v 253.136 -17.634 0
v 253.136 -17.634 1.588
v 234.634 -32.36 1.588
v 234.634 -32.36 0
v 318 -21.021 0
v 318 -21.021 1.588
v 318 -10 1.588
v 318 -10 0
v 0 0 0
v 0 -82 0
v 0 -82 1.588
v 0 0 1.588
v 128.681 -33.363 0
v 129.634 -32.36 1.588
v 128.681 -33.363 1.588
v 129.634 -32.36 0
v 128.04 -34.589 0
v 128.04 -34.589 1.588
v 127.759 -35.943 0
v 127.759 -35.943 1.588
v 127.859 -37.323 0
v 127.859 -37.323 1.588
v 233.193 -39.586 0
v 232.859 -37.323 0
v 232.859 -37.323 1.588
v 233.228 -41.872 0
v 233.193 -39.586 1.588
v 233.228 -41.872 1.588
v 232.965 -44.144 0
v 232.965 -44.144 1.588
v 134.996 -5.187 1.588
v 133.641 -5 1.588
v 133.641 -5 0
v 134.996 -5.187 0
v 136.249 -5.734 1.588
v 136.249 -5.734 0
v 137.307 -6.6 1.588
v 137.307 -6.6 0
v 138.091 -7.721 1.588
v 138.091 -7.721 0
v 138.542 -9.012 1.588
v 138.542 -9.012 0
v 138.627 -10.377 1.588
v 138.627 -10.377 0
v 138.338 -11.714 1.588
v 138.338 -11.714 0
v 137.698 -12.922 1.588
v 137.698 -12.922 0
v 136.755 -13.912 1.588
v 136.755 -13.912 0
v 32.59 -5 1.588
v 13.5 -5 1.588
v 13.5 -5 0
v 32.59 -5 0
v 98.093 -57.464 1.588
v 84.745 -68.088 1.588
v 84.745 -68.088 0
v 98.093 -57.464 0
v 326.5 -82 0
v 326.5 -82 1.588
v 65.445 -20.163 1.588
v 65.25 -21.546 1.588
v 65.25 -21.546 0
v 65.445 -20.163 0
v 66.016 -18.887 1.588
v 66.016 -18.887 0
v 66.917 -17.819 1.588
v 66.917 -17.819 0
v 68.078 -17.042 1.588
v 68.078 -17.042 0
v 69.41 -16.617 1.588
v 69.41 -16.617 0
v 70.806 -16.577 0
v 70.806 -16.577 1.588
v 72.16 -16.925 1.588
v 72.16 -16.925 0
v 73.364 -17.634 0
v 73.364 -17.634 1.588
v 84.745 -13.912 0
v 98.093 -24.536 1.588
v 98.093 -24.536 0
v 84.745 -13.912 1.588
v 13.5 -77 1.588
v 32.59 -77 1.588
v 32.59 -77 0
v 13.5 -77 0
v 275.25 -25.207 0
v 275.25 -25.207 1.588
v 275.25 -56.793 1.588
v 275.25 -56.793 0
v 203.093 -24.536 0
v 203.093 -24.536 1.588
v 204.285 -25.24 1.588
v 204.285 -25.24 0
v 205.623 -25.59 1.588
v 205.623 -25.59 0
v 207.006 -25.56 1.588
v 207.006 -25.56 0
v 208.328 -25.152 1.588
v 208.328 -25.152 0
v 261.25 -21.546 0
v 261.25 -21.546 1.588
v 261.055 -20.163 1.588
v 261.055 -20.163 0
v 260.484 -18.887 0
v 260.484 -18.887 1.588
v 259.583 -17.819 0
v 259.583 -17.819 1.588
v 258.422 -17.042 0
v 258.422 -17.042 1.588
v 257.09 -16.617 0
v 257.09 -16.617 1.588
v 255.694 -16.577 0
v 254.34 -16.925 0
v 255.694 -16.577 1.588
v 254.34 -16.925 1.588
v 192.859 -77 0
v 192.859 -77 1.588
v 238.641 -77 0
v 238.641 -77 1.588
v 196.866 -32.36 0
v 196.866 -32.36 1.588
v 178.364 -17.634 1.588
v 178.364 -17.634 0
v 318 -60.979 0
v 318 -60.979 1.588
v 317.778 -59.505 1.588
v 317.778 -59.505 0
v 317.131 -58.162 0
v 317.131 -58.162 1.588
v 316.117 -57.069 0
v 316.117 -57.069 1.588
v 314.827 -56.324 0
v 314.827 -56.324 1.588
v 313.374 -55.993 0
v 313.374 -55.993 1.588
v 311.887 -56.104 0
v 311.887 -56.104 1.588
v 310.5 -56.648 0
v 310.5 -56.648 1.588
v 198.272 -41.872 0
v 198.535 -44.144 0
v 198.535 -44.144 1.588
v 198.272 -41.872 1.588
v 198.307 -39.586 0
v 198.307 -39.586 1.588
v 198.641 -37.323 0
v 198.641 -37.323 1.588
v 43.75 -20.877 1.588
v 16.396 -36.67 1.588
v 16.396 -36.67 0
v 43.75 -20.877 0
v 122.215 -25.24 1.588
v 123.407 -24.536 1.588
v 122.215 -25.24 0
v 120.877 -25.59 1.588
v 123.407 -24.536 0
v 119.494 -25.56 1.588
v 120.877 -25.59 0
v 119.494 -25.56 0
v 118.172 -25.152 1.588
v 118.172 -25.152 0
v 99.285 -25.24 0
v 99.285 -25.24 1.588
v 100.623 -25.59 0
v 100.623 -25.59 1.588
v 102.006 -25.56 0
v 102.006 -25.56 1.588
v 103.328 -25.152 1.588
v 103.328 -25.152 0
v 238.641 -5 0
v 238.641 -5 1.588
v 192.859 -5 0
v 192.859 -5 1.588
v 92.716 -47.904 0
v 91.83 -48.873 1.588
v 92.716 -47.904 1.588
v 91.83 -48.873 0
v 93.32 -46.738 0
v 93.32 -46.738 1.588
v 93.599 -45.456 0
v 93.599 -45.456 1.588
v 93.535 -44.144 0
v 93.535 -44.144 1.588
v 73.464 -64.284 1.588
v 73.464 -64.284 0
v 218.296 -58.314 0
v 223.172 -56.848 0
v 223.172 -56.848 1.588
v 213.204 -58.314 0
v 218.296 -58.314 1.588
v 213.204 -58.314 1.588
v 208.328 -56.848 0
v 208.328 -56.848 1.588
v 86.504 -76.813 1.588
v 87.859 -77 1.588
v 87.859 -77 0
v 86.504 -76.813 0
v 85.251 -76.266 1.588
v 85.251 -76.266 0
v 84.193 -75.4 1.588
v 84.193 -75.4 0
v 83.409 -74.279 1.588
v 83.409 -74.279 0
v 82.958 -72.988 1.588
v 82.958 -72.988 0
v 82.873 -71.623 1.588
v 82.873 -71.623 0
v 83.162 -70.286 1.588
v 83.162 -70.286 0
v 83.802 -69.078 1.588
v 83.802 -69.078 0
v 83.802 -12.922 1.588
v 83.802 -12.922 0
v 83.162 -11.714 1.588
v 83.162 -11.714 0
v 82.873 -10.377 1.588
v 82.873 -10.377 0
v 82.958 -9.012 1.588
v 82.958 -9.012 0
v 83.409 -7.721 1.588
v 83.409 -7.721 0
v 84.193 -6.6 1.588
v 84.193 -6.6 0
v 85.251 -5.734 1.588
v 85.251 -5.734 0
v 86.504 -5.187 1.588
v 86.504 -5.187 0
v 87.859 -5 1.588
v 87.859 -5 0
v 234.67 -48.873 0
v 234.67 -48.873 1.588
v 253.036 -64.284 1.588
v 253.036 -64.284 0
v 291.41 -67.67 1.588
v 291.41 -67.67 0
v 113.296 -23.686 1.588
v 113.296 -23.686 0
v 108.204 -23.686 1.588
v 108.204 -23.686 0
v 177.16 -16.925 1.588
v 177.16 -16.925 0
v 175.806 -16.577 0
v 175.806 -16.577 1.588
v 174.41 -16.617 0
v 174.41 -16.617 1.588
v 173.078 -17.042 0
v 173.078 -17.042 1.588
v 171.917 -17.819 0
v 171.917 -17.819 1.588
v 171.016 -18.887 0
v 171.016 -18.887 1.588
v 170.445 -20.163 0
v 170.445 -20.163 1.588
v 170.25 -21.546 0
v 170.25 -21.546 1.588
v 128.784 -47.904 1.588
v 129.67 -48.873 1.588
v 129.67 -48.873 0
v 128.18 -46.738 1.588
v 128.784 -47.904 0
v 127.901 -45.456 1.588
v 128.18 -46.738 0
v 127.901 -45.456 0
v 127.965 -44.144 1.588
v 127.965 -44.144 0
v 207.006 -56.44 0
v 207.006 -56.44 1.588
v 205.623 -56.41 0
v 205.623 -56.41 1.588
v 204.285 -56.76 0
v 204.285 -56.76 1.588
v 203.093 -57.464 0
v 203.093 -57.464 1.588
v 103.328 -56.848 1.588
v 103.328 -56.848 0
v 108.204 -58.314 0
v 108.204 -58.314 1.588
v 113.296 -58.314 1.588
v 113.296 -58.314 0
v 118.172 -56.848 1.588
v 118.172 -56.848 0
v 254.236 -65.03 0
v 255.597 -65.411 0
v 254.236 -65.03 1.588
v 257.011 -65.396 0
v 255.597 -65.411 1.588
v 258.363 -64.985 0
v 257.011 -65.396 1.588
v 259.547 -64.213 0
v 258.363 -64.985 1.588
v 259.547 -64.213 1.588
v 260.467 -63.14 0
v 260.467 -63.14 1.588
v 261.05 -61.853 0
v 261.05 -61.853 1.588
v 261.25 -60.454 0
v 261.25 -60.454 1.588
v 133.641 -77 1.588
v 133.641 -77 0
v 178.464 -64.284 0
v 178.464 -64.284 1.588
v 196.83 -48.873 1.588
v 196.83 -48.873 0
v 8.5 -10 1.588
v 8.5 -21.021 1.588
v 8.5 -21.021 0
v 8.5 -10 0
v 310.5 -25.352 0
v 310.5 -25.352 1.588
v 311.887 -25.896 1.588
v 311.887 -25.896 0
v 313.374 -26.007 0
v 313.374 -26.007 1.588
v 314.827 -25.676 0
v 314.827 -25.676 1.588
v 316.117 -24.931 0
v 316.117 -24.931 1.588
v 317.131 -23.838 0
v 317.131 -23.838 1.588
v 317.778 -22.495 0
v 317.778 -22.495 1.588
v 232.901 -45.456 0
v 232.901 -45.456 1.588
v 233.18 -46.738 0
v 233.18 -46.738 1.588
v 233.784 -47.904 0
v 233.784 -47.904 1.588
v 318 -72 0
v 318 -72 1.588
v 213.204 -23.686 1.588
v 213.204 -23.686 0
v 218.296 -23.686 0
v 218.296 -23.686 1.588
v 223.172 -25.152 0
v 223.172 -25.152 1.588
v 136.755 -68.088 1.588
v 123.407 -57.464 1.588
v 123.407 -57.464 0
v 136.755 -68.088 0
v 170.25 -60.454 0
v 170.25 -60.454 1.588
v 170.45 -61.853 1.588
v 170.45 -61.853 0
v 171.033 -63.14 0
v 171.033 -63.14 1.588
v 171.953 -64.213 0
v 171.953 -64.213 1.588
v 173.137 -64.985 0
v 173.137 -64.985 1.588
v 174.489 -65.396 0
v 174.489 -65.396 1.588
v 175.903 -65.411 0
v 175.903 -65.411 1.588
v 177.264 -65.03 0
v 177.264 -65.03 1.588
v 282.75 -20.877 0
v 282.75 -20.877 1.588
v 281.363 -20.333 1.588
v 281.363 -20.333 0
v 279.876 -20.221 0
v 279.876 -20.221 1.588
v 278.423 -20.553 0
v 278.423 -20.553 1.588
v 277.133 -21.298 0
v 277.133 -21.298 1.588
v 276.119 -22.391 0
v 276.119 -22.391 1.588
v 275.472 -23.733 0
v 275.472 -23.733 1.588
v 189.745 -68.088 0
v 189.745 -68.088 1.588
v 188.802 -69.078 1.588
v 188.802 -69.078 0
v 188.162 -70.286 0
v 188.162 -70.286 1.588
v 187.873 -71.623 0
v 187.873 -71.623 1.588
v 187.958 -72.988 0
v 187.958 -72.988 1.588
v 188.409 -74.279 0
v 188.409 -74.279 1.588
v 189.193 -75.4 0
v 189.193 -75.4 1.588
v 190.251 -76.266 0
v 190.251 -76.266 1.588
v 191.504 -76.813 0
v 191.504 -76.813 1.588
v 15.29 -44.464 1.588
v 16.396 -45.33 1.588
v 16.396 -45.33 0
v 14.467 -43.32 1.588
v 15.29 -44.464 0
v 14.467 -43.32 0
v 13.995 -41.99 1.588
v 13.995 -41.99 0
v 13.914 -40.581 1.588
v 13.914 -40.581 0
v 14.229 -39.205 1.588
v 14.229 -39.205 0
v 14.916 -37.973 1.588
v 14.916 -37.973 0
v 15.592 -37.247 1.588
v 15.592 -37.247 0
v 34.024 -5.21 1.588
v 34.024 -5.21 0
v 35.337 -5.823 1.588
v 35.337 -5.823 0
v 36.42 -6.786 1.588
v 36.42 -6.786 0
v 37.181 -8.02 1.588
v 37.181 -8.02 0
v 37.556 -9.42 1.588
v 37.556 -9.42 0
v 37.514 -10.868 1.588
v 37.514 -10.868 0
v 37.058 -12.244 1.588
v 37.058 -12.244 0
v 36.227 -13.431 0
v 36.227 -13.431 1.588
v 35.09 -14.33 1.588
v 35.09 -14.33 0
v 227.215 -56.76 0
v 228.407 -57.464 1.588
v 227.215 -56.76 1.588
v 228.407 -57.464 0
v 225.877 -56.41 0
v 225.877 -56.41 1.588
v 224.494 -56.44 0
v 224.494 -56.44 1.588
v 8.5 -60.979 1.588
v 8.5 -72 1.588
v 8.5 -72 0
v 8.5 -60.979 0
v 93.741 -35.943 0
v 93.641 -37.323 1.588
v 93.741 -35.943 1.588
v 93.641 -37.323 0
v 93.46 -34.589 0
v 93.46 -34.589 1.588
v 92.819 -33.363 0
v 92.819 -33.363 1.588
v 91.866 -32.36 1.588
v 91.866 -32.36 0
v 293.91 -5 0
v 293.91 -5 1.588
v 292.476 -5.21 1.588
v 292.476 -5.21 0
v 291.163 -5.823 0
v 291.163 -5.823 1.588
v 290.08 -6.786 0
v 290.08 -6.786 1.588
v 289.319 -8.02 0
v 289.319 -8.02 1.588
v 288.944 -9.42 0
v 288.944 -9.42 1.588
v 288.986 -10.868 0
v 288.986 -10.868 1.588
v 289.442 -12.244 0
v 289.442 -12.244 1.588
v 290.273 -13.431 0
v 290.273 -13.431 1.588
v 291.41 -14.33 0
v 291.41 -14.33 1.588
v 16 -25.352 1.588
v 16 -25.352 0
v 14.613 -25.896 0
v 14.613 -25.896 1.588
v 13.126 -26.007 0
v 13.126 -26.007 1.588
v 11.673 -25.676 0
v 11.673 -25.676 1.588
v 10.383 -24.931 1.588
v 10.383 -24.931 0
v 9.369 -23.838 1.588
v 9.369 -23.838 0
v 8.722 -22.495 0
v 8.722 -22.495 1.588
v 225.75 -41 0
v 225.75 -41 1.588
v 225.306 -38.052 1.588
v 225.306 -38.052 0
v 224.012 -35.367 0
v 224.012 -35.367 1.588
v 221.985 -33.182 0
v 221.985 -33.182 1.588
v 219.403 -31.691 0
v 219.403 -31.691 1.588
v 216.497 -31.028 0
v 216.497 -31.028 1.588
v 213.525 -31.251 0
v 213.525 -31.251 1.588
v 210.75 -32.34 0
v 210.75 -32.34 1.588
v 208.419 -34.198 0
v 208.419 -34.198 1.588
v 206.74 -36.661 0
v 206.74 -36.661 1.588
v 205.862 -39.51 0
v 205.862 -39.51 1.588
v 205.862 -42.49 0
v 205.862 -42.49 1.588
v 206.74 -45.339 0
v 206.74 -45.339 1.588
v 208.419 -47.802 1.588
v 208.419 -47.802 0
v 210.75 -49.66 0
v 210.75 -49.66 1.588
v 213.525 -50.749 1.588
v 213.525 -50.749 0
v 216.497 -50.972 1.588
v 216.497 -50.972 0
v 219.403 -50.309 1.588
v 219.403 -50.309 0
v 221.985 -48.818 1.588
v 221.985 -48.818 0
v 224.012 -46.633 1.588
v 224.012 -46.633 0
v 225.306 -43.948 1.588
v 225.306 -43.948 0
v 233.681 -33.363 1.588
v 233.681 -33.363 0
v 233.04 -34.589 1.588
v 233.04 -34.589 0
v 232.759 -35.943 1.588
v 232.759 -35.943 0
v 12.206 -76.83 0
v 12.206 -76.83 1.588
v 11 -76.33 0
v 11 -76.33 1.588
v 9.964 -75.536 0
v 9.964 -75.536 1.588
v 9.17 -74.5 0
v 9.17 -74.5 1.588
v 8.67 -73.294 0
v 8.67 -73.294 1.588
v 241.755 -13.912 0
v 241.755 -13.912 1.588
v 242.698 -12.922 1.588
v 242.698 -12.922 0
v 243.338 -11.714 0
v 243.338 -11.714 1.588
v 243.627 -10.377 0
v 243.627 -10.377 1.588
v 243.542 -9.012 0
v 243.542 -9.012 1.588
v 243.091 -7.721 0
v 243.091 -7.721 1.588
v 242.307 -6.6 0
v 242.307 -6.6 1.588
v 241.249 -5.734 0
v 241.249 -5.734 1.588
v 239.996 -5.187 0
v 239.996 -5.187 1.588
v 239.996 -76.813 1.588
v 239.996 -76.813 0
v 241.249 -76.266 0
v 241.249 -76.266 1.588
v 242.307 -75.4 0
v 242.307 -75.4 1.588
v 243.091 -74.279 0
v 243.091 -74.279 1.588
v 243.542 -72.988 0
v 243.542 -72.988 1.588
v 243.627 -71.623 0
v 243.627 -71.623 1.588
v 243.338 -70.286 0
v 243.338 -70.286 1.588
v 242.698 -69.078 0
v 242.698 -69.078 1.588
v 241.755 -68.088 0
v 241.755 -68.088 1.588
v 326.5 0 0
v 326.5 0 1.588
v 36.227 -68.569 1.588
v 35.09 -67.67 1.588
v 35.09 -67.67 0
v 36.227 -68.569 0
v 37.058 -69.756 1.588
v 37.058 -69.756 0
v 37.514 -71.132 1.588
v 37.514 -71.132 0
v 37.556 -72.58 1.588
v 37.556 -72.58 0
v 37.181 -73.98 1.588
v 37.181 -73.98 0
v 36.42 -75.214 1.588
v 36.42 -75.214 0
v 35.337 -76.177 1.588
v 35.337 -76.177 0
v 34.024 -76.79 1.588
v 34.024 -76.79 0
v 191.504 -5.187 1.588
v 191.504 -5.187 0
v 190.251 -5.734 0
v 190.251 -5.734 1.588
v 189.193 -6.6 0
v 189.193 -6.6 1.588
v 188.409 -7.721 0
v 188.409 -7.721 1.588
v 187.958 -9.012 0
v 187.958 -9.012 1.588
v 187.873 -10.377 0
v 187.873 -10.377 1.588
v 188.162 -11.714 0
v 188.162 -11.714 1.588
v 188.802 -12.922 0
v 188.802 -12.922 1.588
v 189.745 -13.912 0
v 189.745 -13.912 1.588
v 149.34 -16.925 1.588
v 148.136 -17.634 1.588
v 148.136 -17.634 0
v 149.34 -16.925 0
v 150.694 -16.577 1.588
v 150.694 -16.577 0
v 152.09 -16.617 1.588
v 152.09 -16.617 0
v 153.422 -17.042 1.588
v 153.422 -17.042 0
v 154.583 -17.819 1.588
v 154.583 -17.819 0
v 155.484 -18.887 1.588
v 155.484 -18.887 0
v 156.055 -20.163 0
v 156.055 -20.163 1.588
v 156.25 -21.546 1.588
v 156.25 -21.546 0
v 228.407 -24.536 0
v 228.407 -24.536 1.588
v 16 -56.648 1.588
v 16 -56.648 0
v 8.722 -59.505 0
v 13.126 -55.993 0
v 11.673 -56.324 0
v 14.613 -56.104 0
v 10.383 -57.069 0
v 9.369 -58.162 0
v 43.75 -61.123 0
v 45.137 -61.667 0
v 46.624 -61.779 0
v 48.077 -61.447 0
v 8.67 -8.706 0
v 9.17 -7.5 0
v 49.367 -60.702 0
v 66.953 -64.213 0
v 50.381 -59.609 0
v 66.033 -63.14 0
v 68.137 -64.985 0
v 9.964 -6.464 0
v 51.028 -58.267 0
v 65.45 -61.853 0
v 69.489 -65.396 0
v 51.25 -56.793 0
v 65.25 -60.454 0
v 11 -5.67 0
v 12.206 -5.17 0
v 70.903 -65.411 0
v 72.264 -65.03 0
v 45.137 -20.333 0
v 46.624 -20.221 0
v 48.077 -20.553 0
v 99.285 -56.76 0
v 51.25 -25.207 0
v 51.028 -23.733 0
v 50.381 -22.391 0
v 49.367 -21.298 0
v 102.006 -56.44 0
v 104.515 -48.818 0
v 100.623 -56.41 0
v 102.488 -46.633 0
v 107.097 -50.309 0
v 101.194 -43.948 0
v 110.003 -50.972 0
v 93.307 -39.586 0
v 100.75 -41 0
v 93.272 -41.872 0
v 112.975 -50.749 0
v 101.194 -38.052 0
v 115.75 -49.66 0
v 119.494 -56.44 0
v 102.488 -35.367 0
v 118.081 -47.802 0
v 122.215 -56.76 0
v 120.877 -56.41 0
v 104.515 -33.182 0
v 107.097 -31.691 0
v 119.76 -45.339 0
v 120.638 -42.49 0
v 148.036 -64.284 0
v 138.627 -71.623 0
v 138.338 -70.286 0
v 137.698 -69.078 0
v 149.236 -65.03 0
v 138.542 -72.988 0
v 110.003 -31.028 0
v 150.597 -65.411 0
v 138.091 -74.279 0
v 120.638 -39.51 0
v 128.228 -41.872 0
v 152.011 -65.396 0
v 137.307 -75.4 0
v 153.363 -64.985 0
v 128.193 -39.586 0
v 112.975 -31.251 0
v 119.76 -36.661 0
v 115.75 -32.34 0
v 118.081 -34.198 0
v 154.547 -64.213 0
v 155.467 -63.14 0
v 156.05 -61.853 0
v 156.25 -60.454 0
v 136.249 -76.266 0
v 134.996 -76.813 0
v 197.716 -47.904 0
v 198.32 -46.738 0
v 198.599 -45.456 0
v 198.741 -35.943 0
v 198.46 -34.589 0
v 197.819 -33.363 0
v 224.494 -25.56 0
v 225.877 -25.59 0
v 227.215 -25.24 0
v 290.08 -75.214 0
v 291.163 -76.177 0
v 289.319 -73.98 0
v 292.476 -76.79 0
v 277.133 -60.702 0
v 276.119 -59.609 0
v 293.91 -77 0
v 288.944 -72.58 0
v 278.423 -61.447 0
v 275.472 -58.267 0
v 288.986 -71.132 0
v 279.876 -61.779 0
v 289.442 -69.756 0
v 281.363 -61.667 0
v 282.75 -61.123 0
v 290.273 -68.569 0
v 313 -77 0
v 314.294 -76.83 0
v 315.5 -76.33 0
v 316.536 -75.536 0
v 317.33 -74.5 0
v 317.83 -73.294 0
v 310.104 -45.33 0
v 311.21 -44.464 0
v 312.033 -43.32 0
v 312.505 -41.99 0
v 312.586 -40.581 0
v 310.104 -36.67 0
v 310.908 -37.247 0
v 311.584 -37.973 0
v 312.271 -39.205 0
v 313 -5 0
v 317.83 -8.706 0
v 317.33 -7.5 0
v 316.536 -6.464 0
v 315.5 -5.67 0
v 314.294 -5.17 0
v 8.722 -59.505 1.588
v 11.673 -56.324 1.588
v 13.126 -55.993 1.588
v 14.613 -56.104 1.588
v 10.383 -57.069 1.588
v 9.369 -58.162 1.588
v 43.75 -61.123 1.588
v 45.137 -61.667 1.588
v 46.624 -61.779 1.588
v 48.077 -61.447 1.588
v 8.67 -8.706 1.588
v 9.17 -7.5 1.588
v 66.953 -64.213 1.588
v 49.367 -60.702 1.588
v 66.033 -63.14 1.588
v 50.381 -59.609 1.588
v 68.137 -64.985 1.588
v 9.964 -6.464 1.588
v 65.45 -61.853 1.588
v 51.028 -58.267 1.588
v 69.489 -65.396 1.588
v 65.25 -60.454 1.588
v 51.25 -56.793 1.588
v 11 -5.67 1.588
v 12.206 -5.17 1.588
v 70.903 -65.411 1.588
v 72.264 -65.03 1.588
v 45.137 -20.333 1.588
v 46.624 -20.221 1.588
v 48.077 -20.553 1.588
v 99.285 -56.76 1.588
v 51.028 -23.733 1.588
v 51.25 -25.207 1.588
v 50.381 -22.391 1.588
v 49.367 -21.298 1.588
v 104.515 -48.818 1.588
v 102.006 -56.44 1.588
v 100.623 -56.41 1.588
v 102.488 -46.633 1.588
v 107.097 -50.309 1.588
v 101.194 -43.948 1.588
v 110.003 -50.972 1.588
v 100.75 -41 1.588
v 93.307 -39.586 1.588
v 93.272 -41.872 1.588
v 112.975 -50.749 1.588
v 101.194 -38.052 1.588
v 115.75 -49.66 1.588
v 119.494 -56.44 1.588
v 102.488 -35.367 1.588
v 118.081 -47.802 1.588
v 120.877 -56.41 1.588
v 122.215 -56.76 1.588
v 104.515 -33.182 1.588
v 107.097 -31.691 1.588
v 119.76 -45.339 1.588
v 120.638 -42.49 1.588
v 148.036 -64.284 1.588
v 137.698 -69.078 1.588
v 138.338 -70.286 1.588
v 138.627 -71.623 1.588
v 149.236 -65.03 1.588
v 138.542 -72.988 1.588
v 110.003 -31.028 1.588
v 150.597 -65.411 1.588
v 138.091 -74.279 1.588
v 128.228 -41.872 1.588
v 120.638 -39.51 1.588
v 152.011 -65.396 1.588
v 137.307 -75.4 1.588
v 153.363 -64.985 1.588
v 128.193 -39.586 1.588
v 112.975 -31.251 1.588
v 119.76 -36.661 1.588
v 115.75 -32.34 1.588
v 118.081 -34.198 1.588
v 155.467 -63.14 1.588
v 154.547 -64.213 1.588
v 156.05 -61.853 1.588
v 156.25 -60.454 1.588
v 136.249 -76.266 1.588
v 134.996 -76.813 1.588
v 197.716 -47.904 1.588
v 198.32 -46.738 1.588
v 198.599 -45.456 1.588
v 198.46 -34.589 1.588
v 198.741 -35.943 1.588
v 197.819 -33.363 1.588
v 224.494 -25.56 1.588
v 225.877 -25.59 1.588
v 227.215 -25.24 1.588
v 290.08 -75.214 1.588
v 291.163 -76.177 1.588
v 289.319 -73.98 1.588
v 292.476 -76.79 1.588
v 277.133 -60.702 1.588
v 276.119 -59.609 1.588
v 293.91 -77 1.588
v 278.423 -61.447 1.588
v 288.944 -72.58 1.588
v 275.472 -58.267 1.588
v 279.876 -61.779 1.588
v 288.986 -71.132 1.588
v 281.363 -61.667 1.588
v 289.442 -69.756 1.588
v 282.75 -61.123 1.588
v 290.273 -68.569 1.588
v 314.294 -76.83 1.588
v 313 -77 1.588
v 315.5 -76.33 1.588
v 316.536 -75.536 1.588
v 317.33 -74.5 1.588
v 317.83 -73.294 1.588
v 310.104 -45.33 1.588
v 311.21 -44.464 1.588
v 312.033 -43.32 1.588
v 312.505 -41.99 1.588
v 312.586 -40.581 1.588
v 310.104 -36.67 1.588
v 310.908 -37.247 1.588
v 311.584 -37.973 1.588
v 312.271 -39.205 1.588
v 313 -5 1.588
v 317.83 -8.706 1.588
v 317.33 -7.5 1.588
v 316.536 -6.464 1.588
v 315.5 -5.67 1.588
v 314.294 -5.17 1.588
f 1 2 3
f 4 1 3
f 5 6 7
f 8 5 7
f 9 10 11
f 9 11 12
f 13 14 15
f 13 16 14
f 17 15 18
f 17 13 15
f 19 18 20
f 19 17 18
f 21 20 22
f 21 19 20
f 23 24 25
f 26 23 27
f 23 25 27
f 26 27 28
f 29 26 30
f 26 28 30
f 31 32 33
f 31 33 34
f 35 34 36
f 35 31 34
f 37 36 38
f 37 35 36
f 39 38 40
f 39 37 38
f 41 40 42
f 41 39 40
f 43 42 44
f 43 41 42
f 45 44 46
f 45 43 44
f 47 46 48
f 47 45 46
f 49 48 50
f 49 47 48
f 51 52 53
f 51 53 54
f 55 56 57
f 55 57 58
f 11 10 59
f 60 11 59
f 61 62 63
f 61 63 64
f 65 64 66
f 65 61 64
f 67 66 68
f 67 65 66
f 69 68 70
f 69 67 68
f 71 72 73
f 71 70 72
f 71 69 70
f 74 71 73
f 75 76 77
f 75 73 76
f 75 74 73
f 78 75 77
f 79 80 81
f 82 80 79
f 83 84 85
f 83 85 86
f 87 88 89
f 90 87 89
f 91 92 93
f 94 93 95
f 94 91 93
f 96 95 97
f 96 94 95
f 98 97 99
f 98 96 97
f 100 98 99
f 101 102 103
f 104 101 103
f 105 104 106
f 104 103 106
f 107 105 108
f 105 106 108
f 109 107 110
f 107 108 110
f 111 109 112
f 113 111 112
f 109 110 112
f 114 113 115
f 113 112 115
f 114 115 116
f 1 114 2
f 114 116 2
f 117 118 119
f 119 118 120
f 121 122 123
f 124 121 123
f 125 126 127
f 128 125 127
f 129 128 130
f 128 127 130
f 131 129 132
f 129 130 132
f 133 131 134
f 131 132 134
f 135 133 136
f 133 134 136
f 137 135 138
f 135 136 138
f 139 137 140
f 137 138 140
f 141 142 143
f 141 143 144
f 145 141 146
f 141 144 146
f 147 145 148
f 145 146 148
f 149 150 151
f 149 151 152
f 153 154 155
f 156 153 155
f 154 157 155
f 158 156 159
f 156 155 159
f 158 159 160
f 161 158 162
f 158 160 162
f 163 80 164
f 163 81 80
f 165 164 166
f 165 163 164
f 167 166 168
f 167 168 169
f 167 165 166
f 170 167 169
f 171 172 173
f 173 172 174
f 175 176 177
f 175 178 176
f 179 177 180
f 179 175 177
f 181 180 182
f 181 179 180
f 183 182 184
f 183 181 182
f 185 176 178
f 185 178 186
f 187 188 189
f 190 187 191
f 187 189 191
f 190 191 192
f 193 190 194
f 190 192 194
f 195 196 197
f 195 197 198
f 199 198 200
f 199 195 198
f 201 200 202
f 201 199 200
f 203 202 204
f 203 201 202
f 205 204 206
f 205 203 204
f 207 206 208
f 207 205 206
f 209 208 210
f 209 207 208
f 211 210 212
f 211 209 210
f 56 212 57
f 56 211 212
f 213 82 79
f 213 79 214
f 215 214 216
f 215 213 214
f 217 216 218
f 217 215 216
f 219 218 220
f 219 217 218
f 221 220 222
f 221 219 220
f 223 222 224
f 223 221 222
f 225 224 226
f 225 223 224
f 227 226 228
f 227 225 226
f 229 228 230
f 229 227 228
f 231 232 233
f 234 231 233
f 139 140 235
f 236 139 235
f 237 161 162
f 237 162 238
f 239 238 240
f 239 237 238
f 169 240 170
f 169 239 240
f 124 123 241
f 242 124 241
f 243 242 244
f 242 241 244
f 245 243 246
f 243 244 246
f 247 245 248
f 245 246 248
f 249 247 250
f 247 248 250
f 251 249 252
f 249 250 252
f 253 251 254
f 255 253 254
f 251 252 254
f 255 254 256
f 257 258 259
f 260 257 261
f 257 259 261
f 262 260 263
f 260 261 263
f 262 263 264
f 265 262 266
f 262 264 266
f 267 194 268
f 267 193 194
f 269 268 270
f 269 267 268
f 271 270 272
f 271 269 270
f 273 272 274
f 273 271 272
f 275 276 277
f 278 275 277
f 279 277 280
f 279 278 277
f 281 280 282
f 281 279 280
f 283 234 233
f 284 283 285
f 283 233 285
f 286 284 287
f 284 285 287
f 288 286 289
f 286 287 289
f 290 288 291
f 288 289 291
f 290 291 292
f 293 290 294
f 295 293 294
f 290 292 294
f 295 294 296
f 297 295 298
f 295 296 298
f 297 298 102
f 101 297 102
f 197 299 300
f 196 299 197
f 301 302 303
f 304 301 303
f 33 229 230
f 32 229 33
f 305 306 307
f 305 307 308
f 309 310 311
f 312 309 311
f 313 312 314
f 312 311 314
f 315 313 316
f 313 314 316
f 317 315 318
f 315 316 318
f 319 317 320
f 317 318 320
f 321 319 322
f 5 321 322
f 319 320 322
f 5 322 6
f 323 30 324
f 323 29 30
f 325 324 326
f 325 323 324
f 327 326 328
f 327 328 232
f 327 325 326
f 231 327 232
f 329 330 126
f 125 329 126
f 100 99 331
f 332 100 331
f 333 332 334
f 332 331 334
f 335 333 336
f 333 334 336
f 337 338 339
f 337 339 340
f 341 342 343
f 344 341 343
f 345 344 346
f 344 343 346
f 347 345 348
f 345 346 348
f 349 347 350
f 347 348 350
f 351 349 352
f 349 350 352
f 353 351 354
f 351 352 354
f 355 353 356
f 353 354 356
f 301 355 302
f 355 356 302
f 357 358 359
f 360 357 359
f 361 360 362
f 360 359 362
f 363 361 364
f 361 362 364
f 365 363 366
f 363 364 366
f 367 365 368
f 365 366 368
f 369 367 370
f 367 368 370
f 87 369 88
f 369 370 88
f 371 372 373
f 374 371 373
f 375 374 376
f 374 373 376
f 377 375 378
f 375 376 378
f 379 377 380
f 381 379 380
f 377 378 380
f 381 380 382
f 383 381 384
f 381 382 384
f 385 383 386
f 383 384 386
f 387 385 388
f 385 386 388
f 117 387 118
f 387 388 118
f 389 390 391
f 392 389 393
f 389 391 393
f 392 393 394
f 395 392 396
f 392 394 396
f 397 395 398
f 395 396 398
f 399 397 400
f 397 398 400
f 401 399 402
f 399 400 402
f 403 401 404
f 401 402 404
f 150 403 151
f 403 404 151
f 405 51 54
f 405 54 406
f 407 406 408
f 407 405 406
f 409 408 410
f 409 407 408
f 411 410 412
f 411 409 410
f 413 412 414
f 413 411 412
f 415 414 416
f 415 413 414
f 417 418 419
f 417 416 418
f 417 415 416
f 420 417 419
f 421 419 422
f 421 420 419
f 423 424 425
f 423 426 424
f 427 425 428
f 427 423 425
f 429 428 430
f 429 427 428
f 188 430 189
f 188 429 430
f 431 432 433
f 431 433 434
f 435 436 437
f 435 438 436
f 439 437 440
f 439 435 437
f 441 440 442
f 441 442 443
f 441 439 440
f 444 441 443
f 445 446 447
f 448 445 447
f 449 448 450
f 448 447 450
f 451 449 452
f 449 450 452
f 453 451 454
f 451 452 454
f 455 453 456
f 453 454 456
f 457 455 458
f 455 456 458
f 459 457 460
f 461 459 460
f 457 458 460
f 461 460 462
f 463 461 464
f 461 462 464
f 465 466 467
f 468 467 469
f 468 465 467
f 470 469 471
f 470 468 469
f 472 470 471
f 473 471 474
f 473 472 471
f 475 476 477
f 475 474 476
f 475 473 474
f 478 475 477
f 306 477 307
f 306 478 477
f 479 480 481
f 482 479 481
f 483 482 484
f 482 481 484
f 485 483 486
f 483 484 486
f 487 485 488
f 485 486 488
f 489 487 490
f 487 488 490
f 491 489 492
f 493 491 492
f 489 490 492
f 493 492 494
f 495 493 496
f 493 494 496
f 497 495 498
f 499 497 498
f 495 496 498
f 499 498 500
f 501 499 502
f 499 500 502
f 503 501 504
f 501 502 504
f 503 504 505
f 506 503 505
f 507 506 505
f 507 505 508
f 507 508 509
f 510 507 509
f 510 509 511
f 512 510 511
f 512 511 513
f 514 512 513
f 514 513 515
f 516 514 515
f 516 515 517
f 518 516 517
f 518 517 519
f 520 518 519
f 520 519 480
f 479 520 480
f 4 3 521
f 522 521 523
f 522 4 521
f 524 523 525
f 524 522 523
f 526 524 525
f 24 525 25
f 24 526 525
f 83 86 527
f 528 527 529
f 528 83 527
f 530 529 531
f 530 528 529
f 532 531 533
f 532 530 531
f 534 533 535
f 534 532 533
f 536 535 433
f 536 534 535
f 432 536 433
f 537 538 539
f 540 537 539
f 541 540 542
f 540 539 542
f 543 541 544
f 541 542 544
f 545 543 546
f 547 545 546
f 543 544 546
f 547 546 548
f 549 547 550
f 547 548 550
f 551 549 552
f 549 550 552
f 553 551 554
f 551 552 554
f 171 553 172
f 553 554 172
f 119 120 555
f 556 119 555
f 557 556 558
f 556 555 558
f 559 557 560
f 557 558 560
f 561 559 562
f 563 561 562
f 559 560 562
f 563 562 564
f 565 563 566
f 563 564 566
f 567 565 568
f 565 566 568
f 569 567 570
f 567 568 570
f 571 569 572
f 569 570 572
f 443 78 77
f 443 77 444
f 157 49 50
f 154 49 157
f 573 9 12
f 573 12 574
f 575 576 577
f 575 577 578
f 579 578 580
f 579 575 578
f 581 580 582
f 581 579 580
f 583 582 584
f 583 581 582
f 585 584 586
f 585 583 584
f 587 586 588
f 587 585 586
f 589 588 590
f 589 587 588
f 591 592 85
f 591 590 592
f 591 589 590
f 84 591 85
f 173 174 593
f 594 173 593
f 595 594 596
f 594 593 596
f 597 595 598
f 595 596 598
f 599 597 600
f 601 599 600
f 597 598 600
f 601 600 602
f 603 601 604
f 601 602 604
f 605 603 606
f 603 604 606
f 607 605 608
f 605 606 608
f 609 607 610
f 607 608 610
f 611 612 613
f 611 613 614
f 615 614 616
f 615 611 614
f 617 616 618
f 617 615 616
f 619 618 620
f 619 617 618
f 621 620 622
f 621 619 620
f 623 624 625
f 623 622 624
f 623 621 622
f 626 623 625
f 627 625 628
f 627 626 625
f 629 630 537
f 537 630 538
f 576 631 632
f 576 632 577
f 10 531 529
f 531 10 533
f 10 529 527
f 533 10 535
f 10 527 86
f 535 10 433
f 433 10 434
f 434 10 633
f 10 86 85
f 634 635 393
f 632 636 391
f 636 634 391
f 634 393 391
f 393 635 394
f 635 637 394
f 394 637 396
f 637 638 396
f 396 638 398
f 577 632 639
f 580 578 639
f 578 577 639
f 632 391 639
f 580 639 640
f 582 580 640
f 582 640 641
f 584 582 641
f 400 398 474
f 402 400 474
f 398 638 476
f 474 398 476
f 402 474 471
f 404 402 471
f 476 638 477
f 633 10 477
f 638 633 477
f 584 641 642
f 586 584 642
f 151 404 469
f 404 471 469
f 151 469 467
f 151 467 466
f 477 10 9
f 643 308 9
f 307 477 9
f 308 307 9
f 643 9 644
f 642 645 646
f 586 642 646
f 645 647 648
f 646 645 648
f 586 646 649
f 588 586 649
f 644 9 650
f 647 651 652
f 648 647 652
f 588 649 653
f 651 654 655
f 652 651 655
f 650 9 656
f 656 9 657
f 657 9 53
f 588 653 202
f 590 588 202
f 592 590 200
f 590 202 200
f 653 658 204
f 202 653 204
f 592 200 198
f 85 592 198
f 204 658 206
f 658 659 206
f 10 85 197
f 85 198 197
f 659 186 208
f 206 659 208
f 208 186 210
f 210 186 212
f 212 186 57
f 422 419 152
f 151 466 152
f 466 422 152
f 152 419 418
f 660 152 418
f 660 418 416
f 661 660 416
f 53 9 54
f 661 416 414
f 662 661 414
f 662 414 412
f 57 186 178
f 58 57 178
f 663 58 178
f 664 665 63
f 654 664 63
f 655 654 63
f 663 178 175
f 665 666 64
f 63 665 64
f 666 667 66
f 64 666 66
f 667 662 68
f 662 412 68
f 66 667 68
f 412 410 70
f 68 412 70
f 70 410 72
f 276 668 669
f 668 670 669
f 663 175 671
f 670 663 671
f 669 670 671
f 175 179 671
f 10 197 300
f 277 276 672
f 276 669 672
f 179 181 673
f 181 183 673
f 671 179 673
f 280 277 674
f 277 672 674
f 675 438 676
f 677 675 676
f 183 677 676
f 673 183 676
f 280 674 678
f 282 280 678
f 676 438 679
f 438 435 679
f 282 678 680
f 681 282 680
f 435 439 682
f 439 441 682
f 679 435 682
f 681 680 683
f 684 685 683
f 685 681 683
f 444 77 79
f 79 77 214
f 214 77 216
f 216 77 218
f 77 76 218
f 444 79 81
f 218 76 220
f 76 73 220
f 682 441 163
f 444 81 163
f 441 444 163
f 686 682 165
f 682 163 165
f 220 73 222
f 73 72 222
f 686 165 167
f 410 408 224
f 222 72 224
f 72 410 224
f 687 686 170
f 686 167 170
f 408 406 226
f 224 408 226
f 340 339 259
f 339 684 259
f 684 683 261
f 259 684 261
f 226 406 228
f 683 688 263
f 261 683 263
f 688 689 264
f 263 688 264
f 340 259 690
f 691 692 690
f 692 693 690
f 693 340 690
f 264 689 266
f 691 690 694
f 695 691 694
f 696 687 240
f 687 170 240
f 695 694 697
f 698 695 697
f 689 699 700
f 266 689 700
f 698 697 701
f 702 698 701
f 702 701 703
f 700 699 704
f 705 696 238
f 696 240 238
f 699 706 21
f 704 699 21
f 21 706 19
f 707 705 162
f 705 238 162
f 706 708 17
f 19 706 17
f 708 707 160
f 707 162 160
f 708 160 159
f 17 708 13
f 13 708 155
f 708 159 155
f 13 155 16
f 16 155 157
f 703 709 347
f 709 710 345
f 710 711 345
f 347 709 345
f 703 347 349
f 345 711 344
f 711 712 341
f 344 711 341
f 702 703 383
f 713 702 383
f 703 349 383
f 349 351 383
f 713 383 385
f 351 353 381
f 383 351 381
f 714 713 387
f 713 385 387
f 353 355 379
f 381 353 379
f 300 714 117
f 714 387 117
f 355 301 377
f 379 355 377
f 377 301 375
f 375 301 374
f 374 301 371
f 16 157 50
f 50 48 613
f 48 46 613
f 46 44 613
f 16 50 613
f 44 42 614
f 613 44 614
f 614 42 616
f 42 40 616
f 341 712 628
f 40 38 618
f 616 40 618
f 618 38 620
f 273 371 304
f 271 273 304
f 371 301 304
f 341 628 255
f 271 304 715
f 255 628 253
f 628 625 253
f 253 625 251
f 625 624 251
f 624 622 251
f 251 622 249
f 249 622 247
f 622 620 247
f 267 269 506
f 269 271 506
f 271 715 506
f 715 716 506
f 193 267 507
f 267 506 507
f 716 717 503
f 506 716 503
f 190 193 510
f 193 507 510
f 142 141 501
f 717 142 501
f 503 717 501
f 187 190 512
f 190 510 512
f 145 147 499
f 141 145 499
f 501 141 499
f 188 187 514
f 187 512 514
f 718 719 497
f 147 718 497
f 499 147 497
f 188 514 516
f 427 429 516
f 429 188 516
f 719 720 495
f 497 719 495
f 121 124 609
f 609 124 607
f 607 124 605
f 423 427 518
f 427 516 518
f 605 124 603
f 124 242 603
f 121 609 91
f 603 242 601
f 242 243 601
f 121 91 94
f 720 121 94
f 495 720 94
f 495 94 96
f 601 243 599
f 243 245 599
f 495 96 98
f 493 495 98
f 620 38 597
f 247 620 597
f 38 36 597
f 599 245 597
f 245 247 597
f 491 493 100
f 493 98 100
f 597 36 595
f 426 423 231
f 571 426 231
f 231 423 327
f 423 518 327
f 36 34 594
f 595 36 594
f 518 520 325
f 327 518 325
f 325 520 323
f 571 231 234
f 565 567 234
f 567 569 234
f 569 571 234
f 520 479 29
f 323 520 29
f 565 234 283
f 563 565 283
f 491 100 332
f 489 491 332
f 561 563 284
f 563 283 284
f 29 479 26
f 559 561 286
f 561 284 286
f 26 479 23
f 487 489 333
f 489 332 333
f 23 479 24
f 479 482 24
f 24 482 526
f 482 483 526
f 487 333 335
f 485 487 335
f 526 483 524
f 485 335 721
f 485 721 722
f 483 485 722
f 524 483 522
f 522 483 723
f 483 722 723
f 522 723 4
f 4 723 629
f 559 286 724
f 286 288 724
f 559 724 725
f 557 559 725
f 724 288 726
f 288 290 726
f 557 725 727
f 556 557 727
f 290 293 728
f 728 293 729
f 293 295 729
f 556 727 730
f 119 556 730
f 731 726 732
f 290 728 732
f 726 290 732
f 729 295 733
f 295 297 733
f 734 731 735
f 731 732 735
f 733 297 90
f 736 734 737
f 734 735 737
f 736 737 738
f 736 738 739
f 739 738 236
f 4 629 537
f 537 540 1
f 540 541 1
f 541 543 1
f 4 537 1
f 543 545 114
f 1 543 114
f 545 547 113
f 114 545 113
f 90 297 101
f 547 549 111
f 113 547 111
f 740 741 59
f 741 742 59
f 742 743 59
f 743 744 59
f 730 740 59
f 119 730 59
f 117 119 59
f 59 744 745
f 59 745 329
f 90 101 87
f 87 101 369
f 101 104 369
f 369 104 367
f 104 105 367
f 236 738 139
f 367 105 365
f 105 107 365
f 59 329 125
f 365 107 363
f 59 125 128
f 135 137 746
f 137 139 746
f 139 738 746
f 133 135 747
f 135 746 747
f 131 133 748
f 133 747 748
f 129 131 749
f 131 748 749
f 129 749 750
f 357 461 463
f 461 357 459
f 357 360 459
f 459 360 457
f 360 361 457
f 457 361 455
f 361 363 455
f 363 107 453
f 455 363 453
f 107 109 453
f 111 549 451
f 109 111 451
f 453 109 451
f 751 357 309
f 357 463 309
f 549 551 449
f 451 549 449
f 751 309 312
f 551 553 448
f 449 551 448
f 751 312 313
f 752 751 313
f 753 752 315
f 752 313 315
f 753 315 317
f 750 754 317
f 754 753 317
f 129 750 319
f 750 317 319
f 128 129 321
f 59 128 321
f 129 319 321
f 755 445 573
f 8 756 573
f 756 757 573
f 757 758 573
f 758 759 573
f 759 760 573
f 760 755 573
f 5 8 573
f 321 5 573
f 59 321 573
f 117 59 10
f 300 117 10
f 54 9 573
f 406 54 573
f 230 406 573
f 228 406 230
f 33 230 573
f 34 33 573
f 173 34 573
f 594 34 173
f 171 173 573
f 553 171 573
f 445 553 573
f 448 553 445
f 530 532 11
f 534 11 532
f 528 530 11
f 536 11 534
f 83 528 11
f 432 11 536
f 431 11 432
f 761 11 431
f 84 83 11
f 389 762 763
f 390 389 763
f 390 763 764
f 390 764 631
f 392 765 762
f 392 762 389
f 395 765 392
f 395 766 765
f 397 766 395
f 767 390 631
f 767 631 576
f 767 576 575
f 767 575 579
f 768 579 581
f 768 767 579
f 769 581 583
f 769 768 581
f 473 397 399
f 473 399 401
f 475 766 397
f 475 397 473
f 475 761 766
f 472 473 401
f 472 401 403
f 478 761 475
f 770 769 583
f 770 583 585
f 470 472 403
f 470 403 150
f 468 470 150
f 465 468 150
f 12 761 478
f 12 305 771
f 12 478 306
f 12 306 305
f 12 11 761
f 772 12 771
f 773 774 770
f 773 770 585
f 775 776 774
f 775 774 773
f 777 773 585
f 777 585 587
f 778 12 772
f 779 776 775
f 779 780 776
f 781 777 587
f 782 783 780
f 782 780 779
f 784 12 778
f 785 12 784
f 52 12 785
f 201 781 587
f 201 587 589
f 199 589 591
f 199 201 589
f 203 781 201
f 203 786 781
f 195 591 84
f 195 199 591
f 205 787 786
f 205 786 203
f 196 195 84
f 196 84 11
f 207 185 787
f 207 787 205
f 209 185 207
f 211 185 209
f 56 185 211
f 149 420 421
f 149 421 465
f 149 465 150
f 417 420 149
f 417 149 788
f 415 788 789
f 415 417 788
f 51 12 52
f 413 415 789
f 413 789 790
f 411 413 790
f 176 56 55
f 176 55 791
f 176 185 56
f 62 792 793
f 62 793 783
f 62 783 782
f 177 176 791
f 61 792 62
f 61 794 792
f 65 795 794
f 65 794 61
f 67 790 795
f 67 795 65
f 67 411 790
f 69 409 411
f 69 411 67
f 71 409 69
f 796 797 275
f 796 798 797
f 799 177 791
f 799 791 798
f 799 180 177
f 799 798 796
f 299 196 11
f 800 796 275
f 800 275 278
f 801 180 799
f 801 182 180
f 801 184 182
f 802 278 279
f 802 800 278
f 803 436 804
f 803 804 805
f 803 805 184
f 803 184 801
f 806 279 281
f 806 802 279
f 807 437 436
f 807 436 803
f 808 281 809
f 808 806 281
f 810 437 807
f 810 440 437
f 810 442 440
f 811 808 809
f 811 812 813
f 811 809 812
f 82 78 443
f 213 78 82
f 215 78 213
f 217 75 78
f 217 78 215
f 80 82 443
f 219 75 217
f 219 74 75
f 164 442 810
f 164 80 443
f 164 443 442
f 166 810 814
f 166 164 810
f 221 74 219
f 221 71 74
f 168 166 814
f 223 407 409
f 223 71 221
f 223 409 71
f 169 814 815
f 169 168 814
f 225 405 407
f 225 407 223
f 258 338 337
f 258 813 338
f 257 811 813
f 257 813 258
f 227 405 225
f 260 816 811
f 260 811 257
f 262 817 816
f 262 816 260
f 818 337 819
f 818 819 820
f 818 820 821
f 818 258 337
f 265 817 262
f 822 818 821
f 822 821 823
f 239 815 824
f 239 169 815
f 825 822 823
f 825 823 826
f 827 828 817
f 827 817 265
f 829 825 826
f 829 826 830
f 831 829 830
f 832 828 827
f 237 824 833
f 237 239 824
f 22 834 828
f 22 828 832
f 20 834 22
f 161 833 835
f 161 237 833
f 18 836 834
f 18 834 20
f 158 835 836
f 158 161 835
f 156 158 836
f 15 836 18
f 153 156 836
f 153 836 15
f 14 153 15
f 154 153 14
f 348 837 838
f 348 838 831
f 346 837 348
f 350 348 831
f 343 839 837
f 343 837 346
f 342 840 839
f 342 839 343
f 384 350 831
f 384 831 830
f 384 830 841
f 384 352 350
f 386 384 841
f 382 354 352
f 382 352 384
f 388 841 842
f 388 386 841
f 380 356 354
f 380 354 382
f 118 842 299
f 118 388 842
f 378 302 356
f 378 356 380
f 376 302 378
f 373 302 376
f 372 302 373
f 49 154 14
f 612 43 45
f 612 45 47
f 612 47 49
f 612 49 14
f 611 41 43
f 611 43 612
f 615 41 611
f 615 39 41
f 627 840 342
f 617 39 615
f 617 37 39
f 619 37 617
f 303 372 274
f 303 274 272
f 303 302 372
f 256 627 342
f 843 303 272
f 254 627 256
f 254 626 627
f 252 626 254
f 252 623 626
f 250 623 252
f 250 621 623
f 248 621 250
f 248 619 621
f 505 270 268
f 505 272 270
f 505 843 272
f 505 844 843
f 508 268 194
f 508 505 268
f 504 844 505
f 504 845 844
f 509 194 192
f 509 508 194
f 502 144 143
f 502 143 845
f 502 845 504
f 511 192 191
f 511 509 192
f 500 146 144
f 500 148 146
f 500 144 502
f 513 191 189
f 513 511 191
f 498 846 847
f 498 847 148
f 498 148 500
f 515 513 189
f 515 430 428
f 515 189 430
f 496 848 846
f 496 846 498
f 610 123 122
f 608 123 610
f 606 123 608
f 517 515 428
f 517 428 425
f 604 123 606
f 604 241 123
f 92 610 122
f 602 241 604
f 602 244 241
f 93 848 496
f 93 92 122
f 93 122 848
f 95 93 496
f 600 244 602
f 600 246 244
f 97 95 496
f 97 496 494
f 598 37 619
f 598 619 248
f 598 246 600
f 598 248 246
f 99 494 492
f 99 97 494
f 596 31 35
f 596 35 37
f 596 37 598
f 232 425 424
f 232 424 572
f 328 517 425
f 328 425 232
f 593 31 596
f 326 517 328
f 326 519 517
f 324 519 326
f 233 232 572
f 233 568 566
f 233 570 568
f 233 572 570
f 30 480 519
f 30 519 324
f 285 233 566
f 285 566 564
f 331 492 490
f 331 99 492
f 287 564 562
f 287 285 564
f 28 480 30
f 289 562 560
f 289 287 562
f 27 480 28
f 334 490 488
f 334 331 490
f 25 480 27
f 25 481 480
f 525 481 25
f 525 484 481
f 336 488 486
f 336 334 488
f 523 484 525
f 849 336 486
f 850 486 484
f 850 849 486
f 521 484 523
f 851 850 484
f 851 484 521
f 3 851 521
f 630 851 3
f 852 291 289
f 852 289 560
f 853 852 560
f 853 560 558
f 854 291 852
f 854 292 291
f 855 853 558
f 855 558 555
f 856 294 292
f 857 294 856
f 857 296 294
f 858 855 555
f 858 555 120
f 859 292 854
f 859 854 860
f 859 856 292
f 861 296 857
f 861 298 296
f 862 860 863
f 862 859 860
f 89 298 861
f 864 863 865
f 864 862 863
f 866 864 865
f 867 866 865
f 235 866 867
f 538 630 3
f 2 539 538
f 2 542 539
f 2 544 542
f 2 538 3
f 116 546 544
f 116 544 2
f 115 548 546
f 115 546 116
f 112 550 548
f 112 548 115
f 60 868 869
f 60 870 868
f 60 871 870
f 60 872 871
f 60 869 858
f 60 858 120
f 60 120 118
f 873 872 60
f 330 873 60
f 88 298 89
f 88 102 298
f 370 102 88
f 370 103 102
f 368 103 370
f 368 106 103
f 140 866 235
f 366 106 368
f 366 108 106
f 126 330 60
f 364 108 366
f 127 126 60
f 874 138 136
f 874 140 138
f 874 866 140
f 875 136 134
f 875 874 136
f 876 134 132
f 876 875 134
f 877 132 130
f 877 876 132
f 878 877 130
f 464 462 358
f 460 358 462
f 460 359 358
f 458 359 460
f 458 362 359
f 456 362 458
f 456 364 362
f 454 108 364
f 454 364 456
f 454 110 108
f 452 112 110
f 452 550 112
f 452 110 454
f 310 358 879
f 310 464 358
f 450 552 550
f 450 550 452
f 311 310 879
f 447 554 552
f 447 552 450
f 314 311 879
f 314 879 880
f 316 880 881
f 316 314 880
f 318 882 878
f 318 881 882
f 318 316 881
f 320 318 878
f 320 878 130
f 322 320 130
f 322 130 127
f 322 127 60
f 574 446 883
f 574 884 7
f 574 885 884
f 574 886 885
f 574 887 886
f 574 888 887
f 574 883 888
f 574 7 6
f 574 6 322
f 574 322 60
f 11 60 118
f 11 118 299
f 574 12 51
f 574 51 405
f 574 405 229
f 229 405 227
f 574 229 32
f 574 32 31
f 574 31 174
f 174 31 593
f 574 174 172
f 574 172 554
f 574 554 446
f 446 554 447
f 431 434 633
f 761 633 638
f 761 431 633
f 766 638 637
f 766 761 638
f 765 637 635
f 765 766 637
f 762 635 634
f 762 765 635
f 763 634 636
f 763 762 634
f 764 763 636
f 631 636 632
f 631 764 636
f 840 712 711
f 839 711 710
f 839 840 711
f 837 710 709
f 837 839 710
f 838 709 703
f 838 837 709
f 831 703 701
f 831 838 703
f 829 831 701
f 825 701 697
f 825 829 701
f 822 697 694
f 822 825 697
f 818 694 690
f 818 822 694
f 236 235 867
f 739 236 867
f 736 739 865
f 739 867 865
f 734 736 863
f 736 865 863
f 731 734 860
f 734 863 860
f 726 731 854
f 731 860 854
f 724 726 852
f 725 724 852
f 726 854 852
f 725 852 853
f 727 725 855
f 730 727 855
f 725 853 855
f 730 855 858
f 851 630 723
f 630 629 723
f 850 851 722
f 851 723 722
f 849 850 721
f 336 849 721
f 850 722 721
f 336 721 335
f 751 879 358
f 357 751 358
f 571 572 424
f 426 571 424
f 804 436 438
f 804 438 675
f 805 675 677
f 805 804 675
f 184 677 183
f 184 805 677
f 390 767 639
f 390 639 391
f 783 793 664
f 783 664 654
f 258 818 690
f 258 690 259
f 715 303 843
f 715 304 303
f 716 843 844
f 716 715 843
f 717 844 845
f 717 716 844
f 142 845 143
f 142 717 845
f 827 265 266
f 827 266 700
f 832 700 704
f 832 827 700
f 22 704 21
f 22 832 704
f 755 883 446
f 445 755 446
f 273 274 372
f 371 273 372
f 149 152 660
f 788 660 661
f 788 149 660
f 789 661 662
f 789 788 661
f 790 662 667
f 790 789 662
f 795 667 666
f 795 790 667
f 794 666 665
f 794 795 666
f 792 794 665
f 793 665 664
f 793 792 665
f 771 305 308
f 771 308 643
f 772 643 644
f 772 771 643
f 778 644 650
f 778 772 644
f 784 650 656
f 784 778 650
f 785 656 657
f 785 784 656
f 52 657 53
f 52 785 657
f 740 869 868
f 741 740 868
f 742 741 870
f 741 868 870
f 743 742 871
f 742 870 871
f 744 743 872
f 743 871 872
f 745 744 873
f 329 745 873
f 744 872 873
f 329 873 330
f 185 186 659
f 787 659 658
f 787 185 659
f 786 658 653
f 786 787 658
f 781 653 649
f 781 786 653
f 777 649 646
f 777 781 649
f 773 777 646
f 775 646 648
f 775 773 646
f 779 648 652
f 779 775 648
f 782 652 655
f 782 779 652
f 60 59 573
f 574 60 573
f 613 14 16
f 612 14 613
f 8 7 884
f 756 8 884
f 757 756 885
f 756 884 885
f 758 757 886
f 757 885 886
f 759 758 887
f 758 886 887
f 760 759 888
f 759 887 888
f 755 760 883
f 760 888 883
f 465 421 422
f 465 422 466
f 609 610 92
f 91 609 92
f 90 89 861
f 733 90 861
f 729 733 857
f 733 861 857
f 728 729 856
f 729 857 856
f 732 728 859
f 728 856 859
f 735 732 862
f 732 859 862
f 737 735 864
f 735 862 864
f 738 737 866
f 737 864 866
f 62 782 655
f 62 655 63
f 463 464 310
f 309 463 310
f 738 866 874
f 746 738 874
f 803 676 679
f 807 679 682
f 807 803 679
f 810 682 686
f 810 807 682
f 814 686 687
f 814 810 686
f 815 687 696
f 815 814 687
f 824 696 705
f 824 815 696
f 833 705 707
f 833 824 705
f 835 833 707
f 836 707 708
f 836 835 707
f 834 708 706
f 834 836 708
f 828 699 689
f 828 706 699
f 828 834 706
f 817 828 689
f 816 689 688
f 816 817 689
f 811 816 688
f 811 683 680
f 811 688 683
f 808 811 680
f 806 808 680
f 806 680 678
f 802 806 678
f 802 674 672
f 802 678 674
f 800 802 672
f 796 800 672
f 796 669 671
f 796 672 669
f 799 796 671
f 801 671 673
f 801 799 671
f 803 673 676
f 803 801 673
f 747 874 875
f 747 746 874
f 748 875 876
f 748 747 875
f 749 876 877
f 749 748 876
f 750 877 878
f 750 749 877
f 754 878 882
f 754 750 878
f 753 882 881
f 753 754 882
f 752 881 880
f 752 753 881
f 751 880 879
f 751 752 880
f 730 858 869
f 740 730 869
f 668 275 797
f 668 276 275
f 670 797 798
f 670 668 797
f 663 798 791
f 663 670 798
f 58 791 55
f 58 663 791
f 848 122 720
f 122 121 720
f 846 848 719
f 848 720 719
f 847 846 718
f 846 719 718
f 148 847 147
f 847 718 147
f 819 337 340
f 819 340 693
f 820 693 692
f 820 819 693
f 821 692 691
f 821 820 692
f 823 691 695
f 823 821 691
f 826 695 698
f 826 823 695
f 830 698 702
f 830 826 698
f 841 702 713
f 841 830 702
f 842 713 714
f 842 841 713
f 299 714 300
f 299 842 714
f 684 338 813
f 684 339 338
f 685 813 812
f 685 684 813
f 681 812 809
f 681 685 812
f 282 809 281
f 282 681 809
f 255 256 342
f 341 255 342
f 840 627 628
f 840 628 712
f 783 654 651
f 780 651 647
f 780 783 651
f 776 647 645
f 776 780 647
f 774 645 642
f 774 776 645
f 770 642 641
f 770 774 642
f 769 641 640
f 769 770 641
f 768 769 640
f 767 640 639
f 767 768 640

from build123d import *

# Parameters (mm, degrees)
SKETCH1_W            = 326.5
SKETCH1_H            = 82
BOSS_EXTRUDE1_DEPTH  = 1.5875
SKETCH2_R            = 10
CUT_EXTRUDE1_DEPTH   = 337.643387216
FILLET1_R            = 5
FILLET2_R            = 5
FILLET1_OF_MIRROR1_R = 5
FILLET2_OF_MIRROR1_R = 5


with BuildPart() as part:
    # Sketch1 → Boss-Extrude1 (new body)
    with BuildSketch(Plane.XY):
        with Locations((163.25, -41)):
            Rectangle(SKETCH1_W, SKETCH1_H)
    extrude(amount=BOSS_EXTRUDE1_DEPTH)

    # Sketch2 → Cut-Extrude1 (cut, through all)
    with BuildSketch(Plane.XY.offset(1.5875)):
        with BuildLine():
            Line((261.25, -60.453756551), (261.25, -21.546243449))
            ThreePointArc((261.25, -21.546243449), (258.421566961, -17.042434291), (253.136281226, -17.634114183))
            Line((253.136281226, -17.634114183), (231.985399239, -34.468399005))
            ThreePointArc((231.985399239, -34.468399005), (233.246092528, -40.630207826), (232.246877073, -46.839781402))
            Line((232.246877073, -46.839781402), (253.036061952, -64.283978766))
            ThreePointArc((253.036061952, -64.283978766), (258.363091309, -64.985295486), (261.25, -60.453756551))
        make_face()
        with BuildLine():
            ThreePointArc((205.742038309, -26.644140472), (215.75, -23.5), (225.757961691, -26.644140472))
            Line((225.757961691, -26.644140472), (241.754677282, -13.912129266))
            ThreePointArc((241.754677282, -13.912129266), (243.361162229, -8.350855727), (238.640958508, -5))
            Line((238.640958508, -5), (192.859041492, -5))
            ThreePointArc((192.859041492, -5), (188.138837771, -8.350855727), (189.745322718, -13.912129266))
            Line((189.745322718, -13.912129266), (205.742038309, -26.644140472))
        make_face()
        with BuildLine():
            Line((241.754677282, -68.087870734), (225.757961691, -55.355859528))
            ThreePointArc((225.757961691, -55.355859528), (215.75, -58.5), (205.742038309, -55.355859528))
            Line((205.742038309, -55.355859528), (189.745322718, -68.087870734))
            ThreePointArc((189.745322718, -68.087870734), (188.138837771, -73.649144273), (192.859041492, -77))
            Line((192.859041492, -77), (238.640958508, -77))
            ThreePointArc((238.640958508, -77), (243.361162229, -73.649144273), (241.754677282, -68.087870734))
        make_face()
        with BuildLine():
            ThreePointArc((199.253122927, -46.839781402), (198.253907472, -40.630207826), (199.514600761, -34.468399005))
            Line((199.514600761, -34.468399005), (178.363718774, -17.634114183))
            ThreePointArc((178.363718774, -17.634114183), (173.078433039, -17.042434291), (170.25, -21.546243449))
            Line((170.25, -21.546243449), (170.25, -60.453756551))
            ThreePointArc((170.25, -60.453756551), (173.136908691, -64.985295486), (178.463938048, -64.283978766))
            Line((178.463938048, -64.283978766), (199.253122927, -46.839781402))
        make_face()
        with BuildLine():
            Line((313, -5), (293.910254038, -5))
            ThreePointArc((293.910254038, -5), (289.080624906, -8.705904774), (291.410254038, -14.330127019))
            Line((291.410254038, -14.330127019), (310.5, -25.351596989))
            ThreePointArc((310.5, -25.351596989), (315.5, -25.351596989), (318, -21.02146997))
            Line((318, -21.02146997), (318, -10))
            ThreePointArc((318, -10), (316.535533906, -6.464466094), (313, -5))
        make_face()
        with BuildLine():
            ThreePointArc((315.5, -42.214646281), (316.262390864, -41.673556851), (316.910726246, -41))
            ThreePointArc((316.910726246, -41), (316.262390864, -40.326443149), (315.5, -39.785353719))
            Line((315.5, -39.785353719), (282.75, -20.877132403))
            ThreePointArc((282.75, -20.877132403), (277.75, -20.877132403), (275.25, -25.207259422))
            Line((275.25, -25.207259422), (275.25, -56.792740578))
            ThreePointArc((275.25, -56.792740578), (277.75, -61.122867597), (282.75, -61.122867597))
            Line((282.75, -61.122867597), (315.5, -42.214646281))
        make_face()
        with BuildLine():
            Line((310.5, -56.648403011), (291.410254038, -67.669872981))
            ThreePointArc((291.410254038, -67.669872981), (289.080624906, -73.294095226), (293.910254038, -77))
            Line((293.910254038, -77), (313, -77))
            ThreePointArc((313, -77), (316.535533906, -75.535533906), (318, -72))
            Line((318, -72), (318, -60.97853003))
            ThreePointArc((318, -60.97853003), (315.5, -56.648403011), (310.5, -56.648403011))
        make_face()
        with Locations((215.75, -41)):
            Circle(SKETCH2_R)
    cut_extrude1 = extrude(amount=-CUT_EXTRUDE1_DEPTH, mode=Mode.SUBTRACT)

    # Fillet1
    fillet1_edges = [part.edges().sort_by_distance(p)[0] for p in [
        (232.246877073, -46.839781402, 0.79375),
        (231.985399239, -34.468399005, 0.79375),
        (205.742038309, -55.355859528, 0.79375),
        (225.757961691, -55.355859528, 0.79375),
        (199.514600761, -34.468399005, 0.79375),
        (199.253122927, -46.839781402, 0.79375),
        (225.757961691, -26.644140472, 0.79375),
        (205.742038309, -26.644140472, 0.79375),
    ]]
    fillet(fillet1_edges, radius=FILLET1_R)

    # Fillet2
    fillet2_edges = [part.edges().sort_by_distance(p)[0] for p in [
        (316.910726246, -41, 0.79375),
    ]]
    fillet(fillet2_edges, radius=FILLET2_R)

    # Mirror1: Cut-Extrude1 across plane
    add(cut_extrude1.mirror(Plane.ZY.offset(-163.25)), mode=Mode.SUBTRACT)

    # Fillet1 of Mirror1
    fillet1_of_mirror1_edges = [part.edges().sort_by_distance(p)[0] for p in [
        (94.253122927, -46.839781402, 0.79375),
        (94.514600761, -34.468399005, 0.79375),
        (120.757961691, -55.355859528, 0.79375),
        (100.742038309, -55.355859528, 0.79375),
        (126.985399239, -34.468399005, 0.79375),
        (127.246877073, -46.839781402, 0.79375),
        (100.742038309, -26.644140472, 0.79375),
        (120.757961691, -26.644140472, 0.79375),
    ]]
    fillet(fillet1_of_mirror1_edges, radius=FILLET1_OF_MIRROR1_R)

    # Fillet2 of Mirror1
    fillet2_of_mirror1_edges = [part.edges().sort_by_distance(p)[0] for p in [
        (9.589273754, -41, 0.79375),
    ]]
    fillet(fillet2_of_mirror1_edges, radius=FILLET2_OF_MIRROR1_R)


solid = part.part
